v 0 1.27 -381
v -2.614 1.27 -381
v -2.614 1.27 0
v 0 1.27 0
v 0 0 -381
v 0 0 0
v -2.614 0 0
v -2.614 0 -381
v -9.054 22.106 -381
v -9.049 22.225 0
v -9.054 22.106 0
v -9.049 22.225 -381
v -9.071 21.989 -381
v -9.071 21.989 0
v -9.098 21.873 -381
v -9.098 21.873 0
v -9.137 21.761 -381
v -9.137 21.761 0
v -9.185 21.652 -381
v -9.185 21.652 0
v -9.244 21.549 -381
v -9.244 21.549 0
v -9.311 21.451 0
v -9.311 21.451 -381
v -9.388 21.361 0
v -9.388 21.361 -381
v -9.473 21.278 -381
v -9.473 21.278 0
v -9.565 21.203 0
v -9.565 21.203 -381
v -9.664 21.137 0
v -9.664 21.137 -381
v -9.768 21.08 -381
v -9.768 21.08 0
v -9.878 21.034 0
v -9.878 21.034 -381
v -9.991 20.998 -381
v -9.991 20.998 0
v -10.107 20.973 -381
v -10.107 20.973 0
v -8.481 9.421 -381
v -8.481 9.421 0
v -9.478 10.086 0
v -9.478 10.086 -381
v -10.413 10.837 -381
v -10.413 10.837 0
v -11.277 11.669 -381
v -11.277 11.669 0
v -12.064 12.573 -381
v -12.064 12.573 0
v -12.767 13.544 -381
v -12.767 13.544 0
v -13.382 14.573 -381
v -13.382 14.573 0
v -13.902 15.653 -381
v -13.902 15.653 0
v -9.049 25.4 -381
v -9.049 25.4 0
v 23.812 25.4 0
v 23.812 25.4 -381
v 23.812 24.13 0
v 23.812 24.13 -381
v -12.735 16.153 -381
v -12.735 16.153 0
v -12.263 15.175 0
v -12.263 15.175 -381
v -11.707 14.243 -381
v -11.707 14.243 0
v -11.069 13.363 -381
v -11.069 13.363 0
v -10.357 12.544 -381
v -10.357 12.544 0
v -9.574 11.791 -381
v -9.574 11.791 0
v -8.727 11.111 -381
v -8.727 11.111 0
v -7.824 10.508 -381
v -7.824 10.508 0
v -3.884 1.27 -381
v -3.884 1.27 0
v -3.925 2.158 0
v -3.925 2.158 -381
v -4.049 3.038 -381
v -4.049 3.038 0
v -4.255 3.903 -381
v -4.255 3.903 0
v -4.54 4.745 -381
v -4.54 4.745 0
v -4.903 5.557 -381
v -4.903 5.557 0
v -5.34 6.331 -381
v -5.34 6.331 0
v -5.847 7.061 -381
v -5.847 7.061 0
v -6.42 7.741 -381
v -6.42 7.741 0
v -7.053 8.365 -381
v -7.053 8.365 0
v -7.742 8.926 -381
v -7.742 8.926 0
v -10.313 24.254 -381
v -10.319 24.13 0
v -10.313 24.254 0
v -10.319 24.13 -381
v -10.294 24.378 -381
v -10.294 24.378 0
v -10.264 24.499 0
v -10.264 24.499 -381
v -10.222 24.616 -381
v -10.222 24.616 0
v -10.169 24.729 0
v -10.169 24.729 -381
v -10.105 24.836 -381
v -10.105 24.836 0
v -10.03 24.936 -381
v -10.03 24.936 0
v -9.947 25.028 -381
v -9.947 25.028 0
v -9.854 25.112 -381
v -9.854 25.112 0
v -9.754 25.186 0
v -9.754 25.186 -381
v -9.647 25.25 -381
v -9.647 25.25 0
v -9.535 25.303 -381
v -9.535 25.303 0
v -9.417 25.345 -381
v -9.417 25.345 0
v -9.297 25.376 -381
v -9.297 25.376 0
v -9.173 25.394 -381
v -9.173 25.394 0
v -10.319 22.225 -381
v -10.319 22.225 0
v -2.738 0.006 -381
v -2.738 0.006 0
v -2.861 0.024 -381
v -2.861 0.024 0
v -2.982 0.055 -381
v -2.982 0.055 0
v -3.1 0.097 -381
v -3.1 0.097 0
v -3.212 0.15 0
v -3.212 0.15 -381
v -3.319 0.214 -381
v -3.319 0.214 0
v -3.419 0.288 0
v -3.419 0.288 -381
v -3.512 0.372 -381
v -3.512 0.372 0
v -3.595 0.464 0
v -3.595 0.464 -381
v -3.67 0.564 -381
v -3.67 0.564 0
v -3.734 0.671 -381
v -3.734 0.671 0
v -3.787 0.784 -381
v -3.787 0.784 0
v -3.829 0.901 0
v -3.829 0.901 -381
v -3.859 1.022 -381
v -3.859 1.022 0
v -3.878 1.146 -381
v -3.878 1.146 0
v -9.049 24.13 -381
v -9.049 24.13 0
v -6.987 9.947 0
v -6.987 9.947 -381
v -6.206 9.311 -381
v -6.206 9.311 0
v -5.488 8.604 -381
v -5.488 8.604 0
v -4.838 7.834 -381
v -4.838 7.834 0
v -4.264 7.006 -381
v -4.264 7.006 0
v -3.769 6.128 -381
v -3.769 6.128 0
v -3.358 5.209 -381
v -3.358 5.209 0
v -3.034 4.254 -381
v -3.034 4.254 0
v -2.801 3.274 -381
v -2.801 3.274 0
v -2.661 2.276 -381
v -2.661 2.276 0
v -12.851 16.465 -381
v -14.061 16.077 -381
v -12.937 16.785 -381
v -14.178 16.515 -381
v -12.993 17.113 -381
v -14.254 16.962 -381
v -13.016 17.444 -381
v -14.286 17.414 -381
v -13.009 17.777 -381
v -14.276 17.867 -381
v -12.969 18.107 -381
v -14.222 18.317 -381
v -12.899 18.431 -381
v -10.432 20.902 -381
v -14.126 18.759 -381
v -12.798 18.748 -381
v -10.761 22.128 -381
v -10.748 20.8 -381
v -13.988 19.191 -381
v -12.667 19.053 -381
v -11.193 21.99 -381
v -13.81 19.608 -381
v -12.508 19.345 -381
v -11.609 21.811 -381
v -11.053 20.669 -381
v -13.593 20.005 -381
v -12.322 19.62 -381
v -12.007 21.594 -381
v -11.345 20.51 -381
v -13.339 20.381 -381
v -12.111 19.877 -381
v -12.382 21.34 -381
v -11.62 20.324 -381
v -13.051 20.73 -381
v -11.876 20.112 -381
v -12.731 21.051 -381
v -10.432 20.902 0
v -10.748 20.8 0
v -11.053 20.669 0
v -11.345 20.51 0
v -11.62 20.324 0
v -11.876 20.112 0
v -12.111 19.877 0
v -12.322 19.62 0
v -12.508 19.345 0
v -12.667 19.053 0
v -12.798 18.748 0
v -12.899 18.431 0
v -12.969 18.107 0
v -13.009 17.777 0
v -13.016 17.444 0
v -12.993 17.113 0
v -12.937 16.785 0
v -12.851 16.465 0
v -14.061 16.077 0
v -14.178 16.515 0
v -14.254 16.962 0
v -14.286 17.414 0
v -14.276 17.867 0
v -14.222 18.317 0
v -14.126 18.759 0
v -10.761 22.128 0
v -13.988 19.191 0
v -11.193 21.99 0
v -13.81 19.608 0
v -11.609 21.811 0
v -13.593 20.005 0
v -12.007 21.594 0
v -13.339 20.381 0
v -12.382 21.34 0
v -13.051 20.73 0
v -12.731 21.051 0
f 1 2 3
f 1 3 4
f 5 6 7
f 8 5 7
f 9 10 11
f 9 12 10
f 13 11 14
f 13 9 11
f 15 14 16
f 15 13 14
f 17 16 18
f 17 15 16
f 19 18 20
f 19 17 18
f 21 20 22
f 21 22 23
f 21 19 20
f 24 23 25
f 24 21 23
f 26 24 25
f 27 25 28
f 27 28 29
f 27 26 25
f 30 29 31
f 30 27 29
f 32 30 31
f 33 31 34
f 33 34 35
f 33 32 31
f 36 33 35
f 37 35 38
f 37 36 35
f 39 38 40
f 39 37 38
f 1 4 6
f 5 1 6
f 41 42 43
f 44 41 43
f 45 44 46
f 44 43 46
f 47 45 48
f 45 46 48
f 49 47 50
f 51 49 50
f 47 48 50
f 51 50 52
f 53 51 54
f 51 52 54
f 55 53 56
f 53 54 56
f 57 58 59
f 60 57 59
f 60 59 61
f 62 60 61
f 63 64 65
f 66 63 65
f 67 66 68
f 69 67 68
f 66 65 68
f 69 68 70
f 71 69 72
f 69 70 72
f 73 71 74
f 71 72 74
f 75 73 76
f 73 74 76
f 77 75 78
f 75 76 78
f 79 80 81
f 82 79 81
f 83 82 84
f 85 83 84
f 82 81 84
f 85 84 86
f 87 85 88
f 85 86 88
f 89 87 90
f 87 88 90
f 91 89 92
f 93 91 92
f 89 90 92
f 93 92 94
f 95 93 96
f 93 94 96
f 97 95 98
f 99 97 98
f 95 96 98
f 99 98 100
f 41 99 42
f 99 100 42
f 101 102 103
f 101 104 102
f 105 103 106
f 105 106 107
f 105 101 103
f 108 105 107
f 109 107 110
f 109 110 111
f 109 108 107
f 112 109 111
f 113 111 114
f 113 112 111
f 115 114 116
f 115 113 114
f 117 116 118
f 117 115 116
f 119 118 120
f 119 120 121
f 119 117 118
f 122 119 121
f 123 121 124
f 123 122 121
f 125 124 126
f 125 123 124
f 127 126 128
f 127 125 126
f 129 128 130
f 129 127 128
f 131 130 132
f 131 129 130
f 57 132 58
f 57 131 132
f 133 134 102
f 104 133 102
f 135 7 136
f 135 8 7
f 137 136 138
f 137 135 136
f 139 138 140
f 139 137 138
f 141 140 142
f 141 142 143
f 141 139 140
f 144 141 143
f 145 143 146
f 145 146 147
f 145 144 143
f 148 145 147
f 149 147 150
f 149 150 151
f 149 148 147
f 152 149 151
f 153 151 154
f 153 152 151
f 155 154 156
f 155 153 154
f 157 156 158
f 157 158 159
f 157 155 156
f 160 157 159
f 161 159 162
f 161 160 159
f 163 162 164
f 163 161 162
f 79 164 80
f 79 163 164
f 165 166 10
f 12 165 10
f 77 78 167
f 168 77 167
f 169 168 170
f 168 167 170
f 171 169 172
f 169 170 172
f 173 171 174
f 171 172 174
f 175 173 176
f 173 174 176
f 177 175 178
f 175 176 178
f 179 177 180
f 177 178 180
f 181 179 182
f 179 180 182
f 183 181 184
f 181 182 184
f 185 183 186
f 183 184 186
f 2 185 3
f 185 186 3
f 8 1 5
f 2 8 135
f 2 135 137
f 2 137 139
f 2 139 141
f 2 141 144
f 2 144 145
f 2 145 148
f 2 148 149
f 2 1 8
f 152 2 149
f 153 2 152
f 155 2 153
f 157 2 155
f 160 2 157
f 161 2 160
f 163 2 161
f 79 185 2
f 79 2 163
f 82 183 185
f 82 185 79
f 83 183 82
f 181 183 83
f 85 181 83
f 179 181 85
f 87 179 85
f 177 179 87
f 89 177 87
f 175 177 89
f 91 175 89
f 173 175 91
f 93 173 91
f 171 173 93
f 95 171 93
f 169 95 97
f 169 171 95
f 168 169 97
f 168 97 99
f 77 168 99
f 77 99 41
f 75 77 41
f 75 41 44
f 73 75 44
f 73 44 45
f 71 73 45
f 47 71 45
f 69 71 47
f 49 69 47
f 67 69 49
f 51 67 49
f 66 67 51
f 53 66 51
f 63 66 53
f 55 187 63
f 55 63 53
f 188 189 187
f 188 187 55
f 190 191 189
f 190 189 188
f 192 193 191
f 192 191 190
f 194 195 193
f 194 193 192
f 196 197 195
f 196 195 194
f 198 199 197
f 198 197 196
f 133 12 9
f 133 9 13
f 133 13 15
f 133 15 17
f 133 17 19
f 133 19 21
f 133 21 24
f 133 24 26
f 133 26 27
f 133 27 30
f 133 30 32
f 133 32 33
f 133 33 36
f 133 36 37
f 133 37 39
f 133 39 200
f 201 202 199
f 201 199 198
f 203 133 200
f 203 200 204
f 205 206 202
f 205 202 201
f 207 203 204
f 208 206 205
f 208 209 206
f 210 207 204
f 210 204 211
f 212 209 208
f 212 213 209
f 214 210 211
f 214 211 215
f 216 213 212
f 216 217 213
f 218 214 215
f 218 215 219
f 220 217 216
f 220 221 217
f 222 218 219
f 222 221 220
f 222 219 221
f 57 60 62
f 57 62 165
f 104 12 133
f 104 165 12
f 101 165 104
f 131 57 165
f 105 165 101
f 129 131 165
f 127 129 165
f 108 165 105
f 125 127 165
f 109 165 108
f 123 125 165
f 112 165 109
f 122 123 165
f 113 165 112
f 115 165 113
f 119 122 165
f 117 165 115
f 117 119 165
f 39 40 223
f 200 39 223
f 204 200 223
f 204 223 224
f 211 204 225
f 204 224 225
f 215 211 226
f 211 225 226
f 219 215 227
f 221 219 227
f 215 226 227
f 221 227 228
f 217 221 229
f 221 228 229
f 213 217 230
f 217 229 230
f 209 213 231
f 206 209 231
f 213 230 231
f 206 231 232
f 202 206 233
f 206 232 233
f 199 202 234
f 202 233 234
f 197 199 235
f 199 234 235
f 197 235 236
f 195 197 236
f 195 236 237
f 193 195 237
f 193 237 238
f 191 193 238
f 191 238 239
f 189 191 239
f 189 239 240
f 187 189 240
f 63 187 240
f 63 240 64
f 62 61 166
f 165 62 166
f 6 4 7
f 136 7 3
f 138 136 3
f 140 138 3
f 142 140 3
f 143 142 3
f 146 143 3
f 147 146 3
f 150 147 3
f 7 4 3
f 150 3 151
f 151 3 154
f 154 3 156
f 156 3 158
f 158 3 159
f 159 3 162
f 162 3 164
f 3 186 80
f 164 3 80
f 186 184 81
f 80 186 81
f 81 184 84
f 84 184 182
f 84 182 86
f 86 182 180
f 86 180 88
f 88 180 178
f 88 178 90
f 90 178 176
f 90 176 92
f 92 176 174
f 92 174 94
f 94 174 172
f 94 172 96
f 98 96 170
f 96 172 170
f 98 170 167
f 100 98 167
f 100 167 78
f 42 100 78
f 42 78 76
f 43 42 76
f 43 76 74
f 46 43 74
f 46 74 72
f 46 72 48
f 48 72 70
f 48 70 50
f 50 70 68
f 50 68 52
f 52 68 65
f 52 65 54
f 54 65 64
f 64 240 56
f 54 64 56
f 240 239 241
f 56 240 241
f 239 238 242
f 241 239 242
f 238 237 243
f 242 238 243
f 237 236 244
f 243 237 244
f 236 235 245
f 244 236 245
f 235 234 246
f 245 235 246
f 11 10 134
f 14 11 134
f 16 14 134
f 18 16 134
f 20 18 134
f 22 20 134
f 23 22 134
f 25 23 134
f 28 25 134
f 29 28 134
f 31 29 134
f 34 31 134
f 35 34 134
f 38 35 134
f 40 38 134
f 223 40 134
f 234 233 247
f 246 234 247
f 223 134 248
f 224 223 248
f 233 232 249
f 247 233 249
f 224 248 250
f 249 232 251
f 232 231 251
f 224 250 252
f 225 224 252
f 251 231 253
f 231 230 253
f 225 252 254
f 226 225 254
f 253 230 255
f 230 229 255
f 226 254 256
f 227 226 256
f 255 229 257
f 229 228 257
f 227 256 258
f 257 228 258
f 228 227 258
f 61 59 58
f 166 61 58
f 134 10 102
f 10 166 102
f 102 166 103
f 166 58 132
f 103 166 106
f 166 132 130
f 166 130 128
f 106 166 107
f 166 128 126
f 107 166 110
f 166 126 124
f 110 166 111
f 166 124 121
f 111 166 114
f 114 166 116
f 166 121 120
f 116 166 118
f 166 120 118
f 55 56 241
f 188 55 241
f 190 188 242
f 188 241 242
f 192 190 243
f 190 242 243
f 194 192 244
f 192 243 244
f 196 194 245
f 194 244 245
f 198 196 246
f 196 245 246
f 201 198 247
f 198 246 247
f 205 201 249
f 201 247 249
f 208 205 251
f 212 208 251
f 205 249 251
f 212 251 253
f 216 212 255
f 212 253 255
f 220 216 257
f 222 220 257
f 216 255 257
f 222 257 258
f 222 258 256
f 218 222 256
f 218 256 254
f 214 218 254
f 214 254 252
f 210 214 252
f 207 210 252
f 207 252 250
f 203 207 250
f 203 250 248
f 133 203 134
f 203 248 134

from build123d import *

# Parameters (mm, degrees)
EXTRUDE_THIN1_DEPTH = 381
FILLET1_R           = 1.27


with BuildPart() as part:
    # Sketch1 → Extrude-Thin1 (new body)
    with BuildSketch(Plane.XY):
        with BuildLine():
            Line((0, 0), (-3.96875, 0))
            ThreePointArc((-3.96875, 0), (-4.818127422, 5.384319506), (-8.48088981, 9.421213144))
            ThreePointArc((-8.48088981, 9.421213144), (-11.680182616, 12.112043916), (-13.902370802, 15.652937077))
            ThreePointArc((-13.902370802, 15.652937077), (-13.70628274, 19.809085553), (-10.31875, 22.225))
            Line((-10.31875, 22.225), (-10.31875, 25.4))
            Line((-10.31875, 25.4), (23.8125, 25.4))
            Line((23.8125, 25.4), (23.8125, 24.13))
            Line((23.8125, 24.13), (-9.04875, 24.13))
            Line((-9.04875, 24.13), (-9.04875, 20.988987709))
            ThreePointArc((-9.04875, 20.988987709), (-12.302505111, 19.646426389), (-12.735071921, 16.153250302))
            ThreePointArc((-12.735071921, 16.153250302), (-10.722030859, 12.945617675), (-7.823847964, 10.508041563))
            ThreePointArc((-7.823847964, 10.508041563), (-4.006030041, 6.572994806), (-2.613703655, 1.27))
            Line((-2.613703655, 1.27), (0, 1.27))
            Line((0, 1.27), (0, 0))
        make_face()
    extrude(amount=-EXTRUDE_THIN1_DEPTH)

    # Fillet1
    fillet1_edges = [part.edges().sort_by_distance(p)[0] for p in [
        (-9.04875, 20.988987709, -190.5),
        (-3.96875, 0, -190.5),
        (-10.31875, 25.4, -190.5),
    ]]
    fillet(fillet1_edges, radius=FILLET1_R)


solid = part.part
